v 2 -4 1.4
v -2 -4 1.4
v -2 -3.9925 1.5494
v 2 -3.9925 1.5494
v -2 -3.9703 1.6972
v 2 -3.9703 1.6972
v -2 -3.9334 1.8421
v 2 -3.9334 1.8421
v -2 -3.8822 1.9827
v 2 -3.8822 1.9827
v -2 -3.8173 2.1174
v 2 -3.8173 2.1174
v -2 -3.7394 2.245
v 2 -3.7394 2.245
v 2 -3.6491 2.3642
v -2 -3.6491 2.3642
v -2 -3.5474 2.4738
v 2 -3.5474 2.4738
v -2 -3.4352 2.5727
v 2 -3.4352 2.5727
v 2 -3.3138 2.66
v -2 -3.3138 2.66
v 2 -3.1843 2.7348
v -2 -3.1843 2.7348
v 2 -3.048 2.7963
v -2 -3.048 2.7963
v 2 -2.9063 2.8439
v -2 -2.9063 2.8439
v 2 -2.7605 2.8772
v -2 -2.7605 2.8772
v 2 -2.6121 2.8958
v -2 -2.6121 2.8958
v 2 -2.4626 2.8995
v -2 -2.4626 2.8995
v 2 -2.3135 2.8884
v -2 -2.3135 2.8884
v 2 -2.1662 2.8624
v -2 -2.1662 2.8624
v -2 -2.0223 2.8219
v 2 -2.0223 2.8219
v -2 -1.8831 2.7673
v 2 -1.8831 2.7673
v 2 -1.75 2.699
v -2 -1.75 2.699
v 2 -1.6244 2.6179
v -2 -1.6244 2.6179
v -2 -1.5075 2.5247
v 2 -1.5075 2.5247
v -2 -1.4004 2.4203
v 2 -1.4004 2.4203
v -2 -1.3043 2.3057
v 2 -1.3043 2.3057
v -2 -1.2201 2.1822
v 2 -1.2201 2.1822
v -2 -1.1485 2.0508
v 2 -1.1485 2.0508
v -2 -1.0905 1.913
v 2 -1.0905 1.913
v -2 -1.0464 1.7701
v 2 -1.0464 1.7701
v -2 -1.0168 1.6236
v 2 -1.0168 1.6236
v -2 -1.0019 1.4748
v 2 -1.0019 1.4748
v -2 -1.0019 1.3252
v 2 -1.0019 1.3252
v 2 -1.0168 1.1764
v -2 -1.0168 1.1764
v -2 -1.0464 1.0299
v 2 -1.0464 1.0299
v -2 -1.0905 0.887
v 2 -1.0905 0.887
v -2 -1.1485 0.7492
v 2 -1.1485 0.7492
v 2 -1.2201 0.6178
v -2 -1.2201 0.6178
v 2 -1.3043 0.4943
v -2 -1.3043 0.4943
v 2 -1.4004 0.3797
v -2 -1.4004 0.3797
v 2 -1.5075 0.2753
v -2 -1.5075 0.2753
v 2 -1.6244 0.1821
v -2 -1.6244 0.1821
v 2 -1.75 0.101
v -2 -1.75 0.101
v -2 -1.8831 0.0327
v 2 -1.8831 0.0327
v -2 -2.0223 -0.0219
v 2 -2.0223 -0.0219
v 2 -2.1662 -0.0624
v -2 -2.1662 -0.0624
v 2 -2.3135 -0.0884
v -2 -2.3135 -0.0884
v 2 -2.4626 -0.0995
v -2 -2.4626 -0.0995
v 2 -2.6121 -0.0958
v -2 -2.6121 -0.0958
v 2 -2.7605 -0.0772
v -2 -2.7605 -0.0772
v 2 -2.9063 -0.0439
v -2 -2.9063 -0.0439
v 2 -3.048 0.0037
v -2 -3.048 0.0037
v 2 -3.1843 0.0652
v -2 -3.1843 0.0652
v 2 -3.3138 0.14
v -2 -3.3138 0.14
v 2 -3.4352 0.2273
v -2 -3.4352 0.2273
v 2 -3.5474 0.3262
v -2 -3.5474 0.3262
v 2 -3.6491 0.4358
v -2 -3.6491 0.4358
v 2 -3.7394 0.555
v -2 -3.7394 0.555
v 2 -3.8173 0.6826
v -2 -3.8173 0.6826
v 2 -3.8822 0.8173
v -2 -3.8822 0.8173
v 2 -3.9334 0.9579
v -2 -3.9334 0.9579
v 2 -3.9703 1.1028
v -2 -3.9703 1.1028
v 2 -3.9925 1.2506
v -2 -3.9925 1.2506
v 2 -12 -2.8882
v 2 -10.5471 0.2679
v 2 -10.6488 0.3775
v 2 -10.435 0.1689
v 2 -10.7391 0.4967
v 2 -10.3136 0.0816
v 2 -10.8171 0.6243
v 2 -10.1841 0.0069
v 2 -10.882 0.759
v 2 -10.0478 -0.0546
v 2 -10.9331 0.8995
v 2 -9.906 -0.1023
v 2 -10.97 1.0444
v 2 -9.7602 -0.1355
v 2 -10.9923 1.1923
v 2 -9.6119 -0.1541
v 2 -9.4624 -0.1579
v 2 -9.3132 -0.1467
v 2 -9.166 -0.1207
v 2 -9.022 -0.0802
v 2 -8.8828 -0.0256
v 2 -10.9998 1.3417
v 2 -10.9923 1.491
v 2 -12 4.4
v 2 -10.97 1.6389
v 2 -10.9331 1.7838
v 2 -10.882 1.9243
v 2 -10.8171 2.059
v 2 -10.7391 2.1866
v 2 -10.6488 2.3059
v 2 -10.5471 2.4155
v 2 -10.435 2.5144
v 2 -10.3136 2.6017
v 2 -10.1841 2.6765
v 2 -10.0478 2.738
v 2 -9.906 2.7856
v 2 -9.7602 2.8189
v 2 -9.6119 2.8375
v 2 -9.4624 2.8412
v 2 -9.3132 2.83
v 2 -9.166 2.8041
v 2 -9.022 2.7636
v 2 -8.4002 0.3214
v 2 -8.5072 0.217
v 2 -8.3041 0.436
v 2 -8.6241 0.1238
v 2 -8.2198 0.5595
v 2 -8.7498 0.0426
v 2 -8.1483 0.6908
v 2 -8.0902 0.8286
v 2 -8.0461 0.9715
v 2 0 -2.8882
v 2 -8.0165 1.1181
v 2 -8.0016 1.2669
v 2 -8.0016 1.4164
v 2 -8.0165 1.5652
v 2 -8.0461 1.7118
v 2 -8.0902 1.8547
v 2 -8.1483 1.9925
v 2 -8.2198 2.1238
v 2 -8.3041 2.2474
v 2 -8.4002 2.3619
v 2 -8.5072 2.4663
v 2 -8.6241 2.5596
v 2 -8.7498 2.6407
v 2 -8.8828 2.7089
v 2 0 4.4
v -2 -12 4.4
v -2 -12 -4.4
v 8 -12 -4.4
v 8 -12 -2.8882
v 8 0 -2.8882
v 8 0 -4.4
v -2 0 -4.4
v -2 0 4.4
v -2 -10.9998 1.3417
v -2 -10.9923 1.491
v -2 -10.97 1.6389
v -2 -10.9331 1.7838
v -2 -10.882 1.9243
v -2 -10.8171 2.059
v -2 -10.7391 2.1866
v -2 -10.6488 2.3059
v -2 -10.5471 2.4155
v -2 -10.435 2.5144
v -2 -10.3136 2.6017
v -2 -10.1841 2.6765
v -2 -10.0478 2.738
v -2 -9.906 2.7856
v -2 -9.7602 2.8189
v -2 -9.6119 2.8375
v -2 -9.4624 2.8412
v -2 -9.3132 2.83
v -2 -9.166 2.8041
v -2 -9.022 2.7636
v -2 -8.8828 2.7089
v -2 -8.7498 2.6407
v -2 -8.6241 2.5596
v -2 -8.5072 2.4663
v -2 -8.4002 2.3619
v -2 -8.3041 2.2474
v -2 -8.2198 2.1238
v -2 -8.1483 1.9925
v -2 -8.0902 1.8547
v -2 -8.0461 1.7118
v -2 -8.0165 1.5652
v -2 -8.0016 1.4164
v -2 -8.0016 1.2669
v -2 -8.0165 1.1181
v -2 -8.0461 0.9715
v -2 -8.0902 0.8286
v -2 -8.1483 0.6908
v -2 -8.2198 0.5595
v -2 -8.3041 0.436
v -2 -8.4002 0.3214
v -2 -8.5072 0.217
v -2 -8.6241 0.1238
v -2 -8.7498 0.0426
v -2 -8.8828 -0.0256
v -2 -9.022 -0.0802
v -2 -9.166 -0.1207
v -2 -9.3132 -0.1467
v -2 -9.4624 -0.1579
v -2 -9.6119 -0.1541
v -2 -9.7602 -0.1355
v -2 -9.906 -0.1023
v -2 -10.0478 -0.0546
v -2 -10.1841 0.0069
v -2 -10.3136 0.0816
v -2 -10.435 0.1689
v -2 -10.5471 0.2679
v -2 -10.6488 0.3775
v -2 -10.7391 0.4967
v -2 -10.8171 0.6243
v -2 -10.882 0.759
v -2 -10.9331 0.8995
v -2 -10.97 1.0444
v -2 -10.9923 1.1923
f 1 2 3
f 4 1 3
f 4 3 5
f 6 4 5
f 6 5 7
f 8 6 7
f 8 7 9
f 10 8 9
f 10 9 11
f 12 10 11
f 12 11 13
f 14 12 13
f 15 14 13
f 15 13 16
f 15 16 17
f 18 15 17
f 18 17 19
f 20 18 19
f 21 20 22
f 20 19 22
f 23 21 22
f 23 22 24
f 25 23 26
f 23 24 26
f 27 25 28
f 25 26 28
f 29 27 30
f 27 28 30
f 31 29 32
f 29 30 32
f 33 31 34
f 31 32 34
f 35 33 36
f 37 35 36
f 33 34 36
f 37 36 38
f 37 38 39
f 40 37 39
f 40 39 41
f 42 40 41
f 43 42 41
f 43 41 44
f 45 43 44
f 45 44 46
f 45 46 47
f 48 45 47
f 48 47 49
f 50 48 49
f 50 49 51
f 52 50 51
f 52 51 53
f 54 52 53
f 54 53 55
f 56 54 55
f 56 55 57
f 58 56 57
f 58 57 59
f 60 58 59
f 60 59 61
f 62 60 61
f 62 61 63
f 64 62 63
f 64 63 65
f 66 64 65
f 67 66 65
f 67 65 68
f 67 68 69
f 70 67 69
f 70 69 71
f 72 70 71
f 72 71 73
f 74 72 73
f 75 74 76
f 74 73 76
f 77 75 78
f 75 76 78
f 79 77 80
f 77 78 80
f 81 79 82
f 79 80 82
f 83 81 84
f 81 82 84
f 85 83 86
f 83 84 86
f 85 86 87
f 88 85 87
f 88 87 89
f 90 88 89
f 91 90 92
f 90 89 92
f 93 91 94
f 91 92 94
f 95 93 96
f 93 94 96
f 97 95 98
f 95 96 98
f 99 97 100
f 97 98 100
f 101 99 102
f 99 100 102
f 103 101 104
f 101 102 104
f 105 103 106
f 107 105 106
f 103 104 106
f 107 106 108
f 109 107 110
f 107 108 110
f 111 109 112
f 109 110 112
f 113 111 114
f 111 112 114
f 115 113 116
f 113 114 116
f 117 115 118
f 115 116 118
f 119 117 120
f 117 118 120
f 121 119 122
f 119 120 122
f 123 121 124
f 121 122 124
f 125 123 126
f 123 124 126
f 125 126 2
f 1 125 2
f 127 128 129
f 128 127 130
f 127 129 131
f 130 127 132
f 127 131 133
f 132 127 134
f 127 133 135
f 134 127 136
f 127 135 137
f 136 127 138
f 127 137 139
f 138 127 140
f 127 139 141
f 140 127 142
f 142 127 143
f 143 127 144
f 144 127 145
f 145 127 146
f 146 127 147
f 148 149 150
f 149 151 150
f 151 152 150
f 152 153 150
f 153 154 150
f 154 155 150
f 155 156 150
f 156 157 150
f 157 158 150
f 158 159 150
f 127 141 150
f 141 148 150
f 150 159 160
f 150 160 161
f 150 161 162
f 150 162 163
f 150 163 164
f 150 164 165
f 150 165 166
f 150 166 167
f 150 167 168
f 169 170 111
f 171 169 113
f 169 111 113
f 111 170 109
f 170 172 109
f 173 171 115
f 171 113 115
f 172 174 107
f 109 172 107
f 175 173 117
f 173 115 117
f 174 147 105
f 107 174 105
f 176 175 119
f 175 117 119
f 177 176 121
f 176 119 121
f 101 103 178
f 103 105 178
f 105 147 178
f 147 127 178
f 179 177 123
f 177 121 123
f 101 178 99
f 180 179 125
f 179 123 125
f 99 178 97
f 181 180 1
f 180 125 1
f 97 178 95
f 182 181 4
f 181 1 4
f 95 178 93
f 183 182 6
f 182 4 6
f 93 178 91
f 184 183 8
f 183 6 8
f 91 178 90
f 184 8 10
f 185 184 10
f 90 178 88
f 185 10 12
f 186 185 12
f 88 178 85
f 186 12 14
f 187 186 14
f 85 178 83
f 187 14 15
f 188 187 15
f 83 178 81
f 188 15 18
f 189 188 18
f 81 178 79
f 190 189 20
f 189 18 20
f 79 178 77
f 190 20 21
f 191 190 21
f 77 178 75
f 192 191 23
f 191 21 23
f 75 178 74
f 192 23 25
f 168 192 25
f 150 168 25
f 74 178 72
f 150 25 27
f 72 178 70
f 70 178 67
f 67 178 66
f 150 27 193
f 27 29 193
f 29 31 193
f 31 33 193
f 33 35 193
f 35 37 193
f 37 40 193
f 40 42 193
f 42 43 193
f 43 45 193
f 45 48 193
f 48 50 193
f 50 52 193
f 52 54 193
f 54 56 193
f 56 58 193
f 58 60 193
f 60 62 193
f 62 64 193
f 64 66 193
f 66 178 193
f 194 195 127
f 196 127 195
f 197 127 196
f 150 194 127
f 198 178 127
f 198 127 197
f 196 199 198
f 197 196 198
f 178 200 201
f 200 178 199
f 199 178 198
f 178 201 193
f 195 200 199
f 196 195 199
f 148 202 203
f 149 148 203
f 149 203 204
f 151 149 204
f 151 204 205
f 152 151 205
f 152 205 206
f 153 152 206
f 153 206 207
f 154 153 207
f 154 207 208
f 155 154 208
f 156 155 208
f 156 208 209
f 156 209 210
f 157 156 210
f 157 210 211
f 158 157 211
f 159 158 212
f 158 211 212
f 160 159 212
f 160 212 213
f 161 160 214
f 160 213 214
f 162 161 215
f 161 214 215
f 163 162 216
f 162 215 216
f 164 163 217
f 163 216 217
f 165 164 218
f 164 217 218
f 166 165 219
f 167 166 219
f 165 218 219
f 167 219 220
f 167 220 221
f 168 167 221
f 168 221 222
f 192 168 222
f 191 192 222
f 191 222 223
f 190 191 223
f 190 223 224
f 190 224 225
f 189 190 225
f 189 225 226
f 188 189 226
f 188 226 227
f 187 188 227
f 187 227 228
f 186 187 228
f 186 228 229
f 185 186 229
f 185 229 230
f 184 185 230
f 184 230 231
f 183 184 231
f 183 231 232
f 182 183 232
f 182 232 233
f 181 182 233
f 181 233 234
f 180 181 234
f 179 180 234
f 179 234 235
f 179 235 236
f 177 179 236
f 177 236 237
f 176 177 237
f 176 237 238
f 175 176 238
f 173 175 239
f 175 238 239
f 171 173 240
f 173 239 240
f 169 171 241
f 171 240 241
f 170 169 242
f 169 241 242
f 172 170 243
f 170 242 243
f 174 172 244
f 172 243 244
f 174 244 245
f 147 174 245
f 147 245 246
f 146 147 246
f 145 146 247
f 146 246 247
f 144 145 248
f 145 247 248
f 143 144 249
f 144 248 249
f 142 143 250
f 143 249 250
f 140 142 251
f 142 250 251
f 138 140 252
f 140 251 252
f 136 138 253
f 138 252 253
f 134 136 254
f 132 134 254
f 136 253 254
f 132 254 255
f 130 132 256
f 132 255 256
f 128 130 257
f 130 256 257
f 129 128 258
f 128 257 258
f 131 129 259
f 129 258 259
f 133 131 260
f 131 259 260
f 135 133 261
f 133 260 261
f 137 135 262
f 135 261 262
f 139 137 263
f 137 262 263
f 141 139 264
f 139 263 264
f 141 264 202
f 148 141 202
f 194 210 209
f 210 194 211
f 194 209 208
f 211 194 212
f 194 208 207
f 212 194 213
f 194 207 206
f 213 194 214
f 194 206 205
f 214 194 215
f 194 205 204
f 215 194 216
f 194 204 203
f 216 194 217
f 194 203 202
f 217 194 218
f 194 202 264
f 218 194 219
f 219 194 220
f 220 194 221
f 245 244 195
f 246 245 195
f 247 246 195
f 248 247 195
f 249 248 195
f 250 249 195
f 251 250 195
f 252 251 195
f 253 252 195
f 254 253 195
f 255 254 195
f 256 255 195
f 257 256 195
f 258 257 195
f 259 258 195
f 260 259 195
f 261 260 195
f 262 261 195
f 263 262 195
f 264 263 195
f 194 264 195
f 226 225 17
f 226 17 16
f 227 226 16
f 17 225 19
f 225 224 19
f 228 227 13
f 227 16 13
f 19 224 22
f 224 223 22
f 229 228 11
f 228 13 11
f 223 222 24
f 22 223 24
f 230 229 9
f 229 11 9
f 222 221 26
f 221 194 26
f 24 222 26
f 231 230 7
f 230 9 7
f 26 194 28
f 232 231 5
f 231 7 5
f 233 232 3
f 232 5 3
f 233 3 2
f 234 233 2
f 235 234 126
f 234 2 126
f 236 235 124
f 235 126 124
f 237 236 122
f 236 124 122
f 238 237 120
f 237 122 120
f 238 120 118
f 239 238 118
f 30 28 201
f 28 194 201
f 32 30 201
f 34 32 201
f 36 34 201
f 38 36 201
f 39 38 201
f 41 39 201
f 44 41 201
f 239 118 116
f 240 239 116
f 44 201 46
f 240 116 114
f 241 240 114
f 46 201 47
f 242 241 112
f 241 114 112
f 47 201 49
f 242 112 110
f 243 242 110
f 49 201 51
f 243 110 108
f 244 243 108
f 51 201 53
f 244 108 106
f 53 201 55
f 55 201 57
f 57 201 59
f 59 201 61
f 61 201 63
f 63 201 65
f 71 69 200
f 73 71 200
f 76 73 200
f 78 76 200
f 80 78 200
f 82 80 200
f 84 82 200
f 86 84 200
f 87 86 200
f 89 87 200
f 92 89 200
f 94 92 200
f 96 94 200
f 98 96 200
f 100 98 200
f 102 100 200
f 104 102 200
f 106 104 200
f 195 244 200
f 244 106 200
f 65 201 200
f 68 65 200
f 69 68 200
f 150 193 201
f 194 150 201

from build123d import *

# Parameters (mm, degrees)
F0_W     = 6
F0_H     = 1.511796
F1_DEPTH = 12
F2_R     = 1.5
F3_DEPTH = 25


with BuildPart() as f1:
    # F0 (on Front) → F1 (new body)
    with BuildSketch(Plane.XZ):
        with Locations((5, -3.644102)):
            Rectangle(F0_W, F0_H)
        Polygon((-2, -4.4), (2, -4.4), (2, -2.888204), (2, 4.4), (-2, 4.4), align=None)
    extrude(amount=F1_DEPTH)

    # F2 (on face) → F3 (cut)
    with BuildSketch(Plane(origin=(-2, 0, 0), x_dir=(0, -1, 0), z_dir=(-1, 0, 0))):
        with Locations((2.5, 1.4)):
            Circle(F2_R)
        with Locations((9.499757, 1.341669)):
            Circle(F2_R)
    extrude(amount=-F3_DEPTH, mode=Mode.SUBTRACT)


solid = f1.part
